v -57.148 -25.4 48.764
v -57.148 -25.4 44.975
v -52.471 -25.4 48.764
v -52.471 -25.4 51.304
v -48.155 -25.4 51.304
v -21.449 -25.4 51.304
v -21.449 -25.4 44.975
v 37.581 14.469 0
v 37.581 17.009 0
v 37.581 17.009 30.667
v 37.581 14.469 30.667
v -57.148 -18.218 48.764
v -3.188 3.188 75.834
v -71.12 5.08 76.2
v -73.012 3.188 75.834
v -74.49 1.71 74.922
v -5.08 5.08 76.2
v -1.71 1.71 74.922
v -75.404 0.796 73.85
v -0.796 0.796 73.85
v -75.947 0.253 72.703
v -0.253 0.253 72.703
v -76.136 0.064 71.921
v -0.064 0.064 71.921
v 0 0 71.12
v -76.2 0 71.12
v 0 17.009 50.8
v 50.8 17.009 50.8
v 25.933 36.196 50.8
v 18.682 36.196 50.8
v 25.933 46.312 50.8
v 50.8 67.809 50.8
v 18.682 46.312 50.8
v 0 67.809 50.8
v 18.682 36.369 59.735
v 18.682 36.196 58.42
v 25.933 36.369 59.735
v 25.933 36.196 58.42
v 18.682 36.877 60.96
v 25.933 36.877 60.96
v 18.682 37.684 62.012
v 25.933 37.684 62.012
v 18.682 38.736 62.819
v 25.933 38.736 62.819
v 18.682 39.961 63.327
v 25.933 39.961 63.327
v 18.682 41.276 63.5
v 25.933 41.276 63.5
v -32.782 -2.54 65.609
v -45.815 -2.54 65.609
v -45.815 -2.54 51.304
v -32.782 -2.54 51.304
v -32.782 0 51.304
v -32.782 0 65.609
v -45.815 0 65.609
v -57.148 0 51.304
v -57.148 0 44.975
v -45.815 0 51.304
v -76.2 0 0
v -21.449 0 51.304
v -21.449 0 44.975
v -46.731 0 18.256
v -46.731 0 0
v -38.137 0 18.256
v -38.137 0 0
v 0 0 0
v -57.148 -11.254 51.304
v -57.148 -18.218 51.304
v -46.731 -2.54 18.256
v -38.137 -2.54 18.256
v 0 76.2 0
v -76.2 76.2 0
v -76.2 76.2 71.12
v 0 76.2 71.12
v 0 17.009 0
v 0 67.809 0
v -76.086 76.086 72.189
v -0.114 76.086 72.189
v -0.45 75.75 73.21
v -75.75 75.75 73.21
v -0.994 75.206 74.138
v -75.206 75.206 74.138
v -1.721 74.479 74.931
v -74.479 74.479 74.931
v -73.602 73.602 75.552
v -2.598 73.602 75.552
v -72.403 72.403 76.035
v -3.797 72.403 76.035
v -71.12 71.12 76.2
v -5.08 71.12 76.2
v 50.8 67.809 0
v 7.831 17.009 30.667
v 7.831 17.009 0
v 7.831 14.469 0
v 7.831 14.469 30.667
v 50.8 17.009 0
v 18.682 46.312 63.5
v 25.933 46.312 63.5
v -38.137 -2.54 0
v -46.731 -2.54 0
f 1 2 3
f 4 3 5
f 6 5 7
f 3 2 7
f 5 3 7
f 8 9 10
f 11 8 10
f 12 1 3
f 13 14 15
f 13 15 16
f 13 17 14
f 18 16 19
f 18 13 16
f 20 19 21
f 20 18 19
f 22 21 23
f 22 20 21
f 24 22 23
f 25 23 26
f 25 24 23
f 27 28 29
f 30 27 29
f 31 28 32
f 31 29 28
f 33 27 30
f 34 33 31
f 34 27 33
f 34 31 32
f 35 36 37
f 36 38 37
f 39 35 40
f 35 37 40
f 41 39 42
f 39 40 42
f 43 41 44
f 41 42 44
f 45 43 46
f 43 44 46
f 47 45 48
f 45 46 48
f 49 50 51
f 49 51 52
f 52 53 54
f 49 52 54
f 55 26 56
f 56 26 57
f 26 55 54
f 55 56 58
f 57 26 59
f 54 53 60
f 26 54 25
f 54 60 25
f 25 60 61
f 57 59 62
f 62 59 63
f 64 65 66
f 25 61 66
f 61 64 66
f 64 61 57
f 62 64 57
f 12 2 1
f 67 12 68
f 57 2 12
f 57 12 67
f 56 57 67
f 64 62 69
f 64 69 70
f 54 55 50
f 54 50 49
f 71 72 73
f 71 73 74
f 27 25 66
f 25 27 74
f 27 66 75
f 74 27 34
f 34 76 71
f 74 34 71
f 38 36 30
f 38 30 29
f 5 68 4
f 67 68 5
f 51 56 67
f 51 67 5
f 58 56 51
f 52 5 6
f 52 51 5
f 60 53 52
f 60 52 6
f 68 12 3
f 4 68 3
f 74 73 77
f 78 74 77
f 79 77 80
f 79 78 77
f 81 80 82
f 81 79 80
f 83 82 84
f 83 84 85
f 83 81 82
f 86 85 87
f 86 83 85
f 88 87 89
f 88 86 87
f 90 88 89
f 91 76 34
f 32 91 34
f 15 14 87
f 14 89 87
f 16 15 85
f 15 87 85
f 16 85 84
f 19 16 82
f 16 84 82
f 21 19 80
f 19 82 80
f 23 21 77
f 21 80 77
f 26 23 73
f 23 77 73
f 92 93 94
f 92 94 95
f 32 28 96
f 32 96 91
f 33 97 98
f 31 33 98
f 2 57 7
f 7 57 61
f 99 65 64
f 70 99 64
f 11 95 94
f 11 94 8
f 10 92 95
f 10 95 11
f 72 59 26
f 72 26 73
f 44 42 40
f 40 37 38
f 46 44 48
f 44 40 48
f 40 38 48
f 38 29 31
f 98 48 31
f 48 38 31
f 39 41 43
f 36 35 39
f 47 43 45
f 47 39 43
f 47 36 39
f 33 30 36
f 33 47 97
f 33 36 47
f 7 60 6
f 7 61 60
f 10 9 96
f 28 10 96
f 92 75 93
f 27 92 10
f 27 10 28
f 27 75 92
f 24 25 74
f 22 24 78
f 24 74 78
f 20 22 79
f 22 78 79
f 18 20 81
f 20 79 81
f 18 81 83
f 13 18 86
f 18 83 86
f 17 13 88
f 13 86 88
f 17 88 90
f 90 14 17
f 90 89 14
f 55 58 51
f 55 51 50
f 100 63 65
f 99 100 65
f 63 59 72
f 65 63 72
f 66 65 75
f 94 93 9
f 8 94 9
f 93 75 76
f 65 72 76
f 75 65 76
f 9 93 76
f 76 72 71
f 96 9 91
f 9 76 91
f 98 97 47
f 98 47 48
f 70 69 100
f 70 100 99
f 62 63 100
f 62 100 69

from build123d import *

# Parameters (mm, degrees)
F0_W      = 76.2
F0_H      = 76.2
F1_DEPTH  = 76.2
F2_W      = 50.8
F2_H      = 50.8
F3_DEPTH  = 50.8
F4_W      = 7.2508919984
F4_H      = 10.1156122983
F5_DEPTH  = 12.7
F6_R      = 5.08
F7_W      = 8.5941962898
F7_H      = 18.2563401759
F8_DEPTH  = 2.54
F10_W     = 29.7498870641
F10_H     = 30.6668374687
F11_DEPTH = 2.54
F12_R     = 5.08
F13_W     = 35.6998704374
F13_H     = 3.7890225649
F14_DEPTH = 25.4
F16_W     = 13.0332894623
F16_H     = 16.8449506164
F17_DEPTH = 2.54
F18_DEPTH = 2.54
F19_DEPTH = 2.54


with BuildPart() as f1:
    # F0 (on Top) → F1 (new body)
    with BuildSketch(Plane.XY):
        with Locations((-38.1, 38.1)):
            Rectangle(F0_W, F0_H)
    extrude(amount=F1_DEPTH)

    # F2 (on face) → F3 (join)
    with BuildSketch(Plane.YZ):
        with Locations((42.4093476772, 25.4)):
            Rectangle(F2_W, F2_H)
    extrude(amount=F3_DEPTH)

    # F4 (on face) → F5 (join)
    with BuildSketch(Plane.XY.offset(50.8)):
        with Locations((22.3073018715, 41.2539299577)):
            Rectangle(F4_W, F4_H)
    extrude(amount=F5_DEPTH)

    # F6
    f6_edges = [f1.edges().sort_by_distance(p)[0] for p in [
        (22.307302, 36.196124, 63.5),
    ]]
    fillet(f6_edges, radius=F6_R)

    # F7 (on face) → F8 (join)
    with BuildSketch(Plane.XZ):
        with Locations((-42.4338337034, 9.1281700879)):
            Rectangle(F7_W, F7_H)
    extrude(amount=F8_DEPTH)

    # F10 (on face) → F11 (join)
    with BuildSketch(Plane.XZ.offset(-17.0093476772)):
        with Locations((22.7058520541, 15.3334187344)):
            Rectangle(F10_W, F10_H)
    extrude(amount=F11_DEPTH)

    # F12
    f12_edges = [f1.edges().sort_by_distance(p)[0] for p in [
        (-38.1, 0, 76.2),
        (0, 38.1, 76.2),
        (-38.1, 76.2, 76.2),
        (-76.2, 38.1, 76.2),
    ]]
    fillet(f12_edges, radius=F12_R)

    # F13 (on face) → F14 (join)
    with BuildSketch(Plane.XZ):
        with Locations((-39.2985325307, 46.8699112535)):
            Rectangle(F13_W, F13_H)
    extrude(amount=F14_DEPTH)

    # F16 (on face) → F17 (join)
    with BuildSketch(Plane.XZ):
        with Locations((-39.2985325307, 57.1868978441)):
            Rectangle(F16_W, F16_H)
    extrude(amount=F17_DEPTH)

    # F15 (on face) → F18 (join)
    with BuildSketch(Plane.XY.offset(48.7644225359)):
        Polygon((-57.1484677494, -18.2180759441), (-52.4711199105, -25.4), (-48.1553934515, -25.4), (-57.1484677494, -11.2543340924), align=None)
    extrude(amount=F18_DEPTH)

    # F19 (add): a face of the model
    f19_faces = [f1.faces().sort_by_distance(p)[0] for p in [
        (-38.1323314504, -12.5401378745, 48.7644225359),
    ]]
    extrude(f19_faces, amount=F19_DEPTH)


solid = f1.part
